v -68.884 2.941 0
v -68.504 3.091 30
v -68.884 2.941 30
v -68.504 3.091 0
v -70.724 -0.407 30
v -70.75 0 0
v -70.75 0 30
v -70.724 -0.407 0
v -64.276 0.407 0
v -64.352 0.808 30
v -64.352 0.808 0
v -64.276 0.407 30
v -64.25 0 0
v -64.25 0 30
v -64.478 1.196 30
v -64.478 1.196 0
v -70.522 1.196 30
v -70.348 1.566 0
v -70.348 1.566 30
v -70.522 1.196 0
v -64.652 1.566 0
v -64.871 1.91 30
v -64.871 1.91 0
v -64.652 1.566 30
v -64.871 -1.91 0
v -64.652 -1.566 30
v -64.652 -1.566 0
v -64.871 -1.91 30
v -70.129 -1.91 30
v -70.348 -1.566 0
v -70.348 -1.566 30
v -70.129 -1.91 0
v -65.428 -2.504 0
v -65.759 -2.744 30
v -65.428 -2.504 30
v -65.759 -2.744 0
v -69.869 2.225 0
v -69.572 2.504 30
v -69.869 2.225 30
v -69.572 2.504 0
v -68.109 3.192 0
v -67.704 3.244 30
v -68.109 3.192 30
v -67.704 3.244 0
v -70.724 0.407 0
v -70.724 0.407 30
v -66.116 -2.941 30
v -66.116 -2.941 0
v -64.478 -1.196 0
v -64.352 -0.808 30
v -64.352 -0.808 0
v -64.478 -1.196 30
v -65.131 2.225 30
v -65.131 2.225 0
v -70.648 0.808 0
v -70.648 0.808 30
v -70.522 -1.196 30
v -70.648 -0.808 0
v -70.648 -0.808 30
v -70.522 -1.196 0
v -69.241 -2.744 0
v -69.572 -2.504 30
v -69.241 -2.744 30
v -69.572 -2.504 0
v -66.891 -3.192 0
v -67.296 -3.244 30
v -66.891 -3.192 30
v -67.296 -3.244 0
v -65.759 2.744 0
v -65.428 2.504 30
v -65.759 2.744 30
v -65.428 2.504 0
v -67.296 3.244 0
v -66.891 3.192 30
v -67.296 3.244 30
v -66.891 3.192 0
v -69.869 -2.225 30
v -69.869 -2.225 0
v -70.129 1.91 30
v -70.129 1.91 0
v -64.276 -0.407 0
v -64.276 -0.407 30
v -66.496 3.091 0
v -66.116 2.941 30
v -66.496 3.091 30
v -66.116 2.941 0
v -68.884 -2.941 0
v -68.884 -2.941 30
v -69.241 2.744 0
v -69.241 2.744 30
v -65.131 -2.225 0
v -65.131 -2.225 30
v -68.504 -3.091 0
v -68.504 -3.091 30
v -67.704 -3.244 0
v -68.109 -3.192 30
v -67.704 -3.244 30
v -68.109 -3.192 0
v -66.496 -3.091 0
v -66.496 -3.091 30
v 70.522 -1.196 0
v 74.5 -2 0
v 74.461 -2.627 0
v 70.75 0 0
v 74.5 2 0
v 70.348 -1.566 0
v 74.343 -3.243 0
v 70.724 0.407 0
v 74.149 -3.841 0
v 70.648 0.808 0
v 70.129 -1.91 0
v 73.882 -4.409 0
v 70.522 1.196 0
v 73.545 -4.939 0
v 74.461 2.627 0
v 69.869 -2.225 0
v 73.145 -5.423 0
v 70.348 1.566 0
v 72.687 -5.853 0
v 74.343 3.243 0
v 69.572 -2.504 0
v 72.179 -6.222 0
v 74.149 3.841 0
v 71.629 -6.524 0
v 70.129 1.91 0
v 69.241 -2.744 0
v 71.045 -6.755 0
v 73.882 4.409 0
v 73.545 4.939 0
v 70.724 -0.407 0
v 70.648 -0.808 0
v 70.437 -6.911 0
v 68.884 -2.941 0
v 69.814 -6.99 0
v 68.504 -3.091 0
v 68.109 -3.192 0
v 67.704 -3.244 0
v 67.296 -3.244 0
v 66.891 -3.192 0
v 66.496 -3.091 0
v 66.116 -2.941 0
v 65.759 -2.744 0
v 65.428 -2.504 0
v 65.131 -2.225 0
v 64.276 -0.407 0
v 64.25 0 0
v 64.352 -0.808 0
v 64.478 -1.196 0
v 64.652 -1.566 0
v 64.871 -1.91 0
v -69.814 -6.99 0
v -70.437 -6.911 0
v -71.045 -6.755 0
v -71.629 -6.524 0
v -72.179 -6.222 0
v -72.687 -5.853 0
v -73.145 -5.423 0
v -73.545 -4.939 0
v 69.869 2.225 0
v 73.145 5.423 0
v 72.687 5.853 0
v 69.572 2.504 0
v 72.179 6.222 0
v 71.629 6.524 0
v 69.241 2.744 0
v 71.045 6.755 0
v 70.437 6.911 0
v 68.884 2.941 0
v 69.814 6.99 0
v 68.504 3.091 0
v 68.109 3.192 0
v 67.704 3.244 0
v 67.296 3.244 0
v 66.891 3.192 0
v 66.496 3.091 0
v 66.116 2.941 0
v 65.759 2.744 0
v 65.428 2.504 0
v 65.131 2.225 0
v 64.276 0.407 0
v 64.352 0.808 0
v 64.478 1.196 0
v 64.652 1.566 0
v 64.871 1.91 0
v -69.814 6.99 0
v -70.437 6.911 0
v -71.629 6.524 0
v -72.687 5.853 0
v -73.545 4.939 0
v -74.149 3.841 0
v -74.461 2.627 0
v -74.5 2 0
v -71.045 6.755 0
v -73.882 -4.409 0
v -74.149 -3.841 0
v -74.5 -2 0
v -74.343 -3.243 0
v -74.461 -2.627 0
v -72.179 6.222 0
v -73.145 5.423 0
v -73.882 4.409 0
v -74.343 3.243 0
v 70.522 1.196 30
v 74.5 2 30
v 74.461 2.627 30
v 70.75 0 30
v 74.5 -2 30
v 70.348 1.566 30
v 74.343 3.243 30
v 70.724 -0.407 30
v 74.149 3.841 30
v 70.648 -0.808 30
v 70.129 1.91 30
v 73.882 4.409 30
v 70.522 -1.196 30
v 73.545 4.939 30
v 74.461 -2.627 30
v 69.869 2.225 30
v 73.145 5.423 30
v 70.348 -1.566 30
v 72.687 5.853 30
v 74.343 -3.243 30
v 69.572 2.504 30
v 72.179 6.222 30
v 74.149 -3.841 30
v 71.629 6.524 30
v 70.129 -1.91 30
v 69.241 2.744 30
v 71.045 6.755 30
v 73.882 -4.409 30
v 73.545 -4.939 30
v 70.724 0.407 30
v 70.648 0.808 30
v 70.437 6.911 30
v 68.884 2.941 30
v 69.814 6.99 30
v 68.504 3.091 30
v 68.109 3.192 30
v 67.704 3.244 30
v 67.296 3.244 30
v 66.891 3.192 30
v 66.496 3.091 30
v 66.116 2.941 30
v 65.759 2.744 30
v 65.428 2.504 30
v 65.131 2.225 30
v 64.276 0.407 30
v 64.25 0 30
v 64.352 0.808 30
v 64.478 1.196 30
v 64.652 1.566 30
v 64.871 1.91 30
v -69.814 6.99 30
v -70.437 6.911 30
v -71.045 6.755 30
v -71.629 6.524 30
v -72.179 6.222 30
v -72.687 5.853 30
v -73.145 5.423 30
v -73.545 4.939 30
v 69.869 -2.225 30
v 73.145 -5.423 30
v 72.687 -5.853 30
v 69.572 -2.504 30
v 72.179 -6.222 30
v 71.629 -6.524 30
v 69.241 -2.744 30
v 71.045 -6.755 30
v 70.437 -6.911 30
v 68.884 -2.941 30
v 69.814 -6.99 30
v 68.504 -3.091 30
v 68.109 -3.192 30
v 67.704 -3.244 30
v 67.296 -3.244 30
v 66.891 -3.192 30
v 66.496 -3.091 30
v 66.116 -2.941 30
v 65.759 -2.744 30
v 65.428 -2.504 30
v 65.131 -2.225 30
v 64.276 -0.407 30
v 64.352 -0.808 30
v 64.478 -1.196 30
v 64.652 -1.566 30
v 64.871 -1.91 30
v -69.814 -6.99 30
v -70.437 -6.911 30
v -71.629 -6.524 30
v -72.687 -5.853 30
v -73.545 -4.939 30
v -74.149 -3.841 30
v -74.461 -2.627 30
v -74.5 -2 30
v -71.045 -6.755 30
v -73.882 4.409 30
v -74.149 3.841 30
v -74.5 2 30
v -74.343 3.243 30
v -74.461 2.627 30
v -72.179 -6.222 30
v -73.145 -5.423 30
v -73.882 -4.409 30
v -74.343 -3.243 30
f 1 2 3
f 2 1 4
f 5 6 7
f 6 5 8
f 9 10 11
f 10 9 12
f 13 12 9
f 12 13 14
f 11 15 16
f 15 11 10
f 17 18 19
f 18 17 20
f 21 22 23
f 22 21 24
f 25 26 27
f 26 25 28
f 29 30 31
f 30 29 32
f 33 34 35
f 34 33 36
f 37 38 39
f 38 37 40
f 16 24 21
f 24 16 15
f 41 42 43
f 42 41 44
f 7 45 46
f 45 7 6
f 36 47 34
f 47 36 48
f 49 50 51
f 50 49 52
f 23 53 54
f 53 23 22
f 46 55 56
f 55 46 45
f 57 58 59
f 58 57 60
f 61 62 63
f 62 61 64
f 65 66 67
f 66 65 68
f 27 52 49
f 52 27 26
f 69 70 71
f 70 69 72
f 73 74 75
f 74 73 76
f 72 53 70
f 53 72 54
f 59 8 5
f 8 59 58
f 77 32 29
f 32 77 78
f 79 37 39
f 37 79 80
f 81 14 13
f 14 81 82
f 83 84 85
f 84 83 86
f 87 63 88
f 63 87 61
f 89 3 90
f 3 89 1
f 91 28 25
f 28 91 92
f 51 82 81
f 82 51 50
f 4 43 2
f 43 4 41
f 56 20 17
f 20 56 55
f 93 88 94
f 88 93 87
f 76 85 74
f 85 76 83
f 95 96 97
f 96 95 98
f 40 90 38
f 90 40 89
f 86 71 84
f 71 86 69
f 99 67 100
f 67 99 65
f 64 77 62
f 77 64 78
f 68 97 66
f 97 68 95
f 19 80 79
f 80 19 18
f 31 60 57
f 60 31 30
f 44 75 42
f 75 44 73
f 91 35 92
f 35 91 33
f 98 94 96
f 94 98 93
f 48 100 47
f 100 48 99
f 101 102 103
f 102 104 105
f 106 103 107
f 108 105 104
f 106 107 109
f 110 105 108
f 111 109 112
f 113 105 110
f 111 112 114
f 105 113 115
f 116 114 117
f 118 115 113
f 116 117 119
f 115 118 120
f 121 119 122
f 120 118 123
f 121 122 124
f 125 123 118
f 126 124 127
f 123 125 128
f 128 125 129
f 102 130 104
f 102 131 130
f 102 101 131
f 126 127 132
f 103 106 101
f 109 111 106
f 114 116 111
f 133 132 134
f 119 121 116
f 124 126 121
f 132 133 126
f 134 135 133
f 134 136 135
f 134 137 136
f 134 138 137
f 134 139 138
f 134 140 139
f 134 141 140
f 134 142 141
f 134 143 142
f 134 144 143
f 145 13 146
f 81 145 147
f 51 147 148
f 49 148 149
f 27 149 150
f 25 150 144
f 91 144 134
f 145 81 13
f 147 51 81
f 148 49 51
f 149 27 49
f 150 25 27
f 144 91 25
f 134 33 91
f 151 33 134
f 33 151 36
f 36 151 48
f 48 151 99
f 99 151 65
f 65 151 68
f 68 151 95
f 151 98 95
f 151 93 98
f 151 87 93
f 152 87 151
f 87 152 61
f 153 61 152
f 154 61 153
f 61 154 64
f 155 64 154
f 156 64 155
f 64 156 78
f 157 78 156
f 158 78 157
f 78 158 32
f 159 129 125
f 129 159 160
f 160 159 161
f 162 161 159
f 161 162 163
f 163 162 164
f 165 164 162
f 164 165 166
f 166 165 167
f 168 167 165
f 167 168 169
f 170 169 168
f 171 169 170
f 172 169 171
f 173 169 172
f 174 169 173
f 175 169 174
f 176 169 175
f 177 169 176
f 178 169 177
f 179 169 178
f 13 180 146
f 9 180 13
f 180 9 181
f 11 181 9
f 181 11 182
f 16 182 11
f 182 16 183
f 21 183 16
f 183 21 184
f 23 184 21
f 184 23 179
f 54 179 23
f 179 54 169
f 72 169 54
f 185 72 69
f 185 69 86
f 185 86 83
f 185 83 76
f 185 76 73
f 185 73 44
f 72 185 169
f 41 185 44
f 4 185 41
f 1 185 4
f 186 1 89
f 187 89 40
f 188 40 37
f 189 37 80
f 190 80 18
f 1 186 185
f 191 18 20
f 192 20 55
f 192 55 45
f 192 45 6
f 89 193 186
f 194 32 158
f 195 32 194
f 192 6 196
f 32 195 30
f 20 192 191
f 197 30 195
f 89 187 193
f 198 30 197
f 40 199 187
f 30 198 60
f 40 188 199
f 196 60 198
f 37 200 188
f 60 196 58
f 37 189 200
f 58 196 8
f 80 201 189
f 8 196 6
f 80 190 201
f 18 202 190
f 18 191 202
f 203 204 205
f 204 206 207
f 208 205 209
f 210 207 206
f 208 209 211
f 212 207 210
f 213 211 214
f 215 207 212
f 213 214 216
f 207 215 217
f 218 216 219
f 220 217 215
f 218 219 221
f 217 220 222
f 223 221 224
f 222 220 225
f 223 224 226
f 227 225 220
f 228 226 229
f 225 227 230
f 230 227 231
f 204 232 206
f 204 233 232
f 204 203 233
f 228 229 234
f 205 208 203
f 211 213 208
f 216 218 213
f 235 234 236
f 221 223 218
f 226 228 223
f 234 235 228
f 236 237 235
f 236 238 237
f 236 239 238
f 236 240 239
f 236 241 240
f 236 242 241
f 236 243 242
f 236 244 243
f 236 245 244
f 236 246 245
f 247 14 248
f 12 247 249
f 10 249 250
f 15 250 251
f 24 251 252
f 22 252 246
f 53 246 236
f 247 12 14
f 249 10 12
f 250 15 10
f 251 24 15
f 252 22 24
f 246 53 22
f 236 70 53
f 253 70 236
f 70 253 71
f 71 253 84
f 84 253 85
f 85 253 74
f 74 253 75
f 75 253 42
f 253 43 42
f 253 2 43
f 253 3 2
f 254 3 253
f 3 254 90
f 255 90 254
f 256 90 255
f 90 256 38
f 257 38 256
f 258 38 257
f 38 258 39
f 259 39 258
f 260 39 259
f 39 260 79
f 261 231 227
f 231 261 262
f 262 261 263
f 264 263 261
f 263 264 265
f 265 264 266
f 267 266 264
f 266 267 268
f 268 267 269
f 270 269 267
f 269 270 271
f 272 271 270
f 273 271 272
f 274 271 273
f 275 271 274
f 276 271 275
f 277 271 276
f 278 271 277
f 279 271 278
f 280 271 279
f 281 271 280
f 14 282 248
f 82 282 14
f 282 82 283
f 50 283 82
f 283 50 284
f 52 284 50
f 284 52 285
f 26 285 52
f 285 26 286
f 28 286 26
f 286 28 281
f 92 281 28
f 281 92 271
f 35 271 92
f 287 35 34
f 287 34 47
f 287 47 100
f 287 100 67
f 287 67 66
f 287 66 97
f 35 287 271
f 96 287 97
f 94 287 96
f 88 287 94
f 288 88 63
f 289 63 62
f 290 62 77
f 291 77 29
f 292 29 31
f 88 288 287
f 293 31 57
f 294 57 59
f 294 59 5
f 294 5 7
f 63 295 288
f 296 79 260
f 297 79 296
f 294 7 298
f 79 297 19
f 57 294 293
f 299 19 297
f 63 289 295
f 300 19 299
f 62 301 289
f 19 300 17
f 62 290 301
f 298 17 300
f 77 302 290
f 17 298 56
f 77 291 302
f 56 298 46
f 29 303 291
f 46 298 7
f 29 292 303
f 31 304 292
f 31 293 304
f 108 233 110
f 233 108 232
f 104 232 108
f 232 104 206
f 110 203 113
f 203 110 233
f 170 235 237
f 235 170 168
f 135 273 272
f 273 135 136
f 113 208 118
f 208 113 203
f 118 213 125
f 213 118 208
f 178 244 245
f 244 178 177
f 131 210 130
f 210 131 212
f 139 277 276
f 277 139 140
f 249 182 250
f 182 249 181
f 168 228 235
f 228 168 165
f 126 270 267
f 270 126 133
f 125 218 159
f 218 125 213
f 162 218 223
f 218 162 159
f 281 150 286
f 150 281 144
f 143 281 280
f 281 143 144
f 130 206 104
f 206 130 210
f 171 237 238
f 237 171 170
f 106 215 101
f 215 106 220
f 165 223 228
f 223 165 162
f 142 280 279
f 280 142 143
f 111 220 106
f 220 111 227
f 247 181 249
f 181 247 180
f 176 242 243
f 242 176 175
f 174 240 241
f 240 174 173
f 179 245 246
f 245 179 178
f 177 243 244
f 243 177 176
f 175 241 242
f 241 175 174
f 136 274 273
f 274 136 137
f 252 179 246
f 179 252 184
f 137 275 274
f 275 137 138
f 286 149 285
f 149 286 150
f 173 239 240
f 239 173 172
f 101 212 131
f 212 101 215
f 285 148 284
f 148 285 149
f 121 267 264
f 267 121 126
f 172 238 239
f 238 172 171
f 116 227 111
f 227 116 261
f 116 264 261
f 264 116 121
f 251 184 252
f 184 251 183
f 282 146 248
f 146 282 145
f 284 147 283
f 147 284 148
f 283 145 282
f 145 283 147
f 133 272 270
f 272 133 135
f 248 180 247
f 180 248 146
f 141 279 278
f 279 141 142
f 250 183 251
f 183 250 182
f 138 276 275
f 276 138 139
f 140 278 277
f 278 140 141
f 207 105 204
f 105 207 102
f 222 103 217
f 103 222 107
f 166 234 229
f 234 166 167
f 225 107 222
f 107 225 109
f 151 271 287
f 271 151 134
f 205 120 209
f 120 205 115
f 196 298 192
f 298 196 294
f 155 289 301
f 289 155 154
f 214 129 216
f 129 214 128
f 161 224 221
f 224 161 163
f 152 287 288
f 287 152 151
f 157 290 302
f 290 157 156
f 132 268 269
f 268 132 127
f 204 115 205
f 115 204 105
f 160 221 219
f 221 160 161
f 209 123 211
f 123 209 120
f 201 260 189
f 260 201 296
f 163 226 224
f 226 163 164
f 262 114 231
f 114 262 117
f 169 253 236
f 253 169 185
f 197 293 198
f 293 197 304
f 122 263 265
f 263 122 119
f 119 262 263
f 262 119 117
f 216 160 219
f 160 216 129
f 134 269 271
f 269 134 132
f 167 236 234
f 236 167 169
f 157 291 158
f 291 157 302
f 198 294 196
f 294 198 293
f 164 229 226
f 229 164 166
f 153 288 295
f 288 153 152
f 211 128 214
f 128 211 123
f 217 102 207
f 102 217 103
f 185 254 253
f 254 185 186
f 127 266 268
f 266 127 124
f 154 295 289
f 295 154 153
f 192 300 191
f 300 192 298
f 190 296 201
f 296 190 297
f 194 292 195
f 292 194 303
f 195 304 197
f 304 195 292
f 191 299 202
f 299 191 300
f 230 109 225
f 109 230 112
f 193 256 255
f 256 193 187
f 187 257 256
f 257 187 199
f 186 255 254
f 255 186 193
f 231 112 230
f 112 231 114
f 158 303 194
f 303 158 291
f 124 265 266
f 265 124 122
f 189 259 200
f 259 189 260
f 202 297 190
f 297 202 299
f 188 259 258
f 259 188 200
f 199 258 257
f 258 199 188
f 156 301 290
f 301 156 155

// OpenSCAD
$fn = 50;


difference() {
	union() {
		hull() {
			translate(v = [-69.5000000000, 2.0000000000, 0]) {
				cylinder(h = 30, r = 5);
			}
			translate(v = [69.5000000000, 2.0000000000, 0]) {
				cylinder(h = 30, r = 5);
			}
			translate(v = [-69.5000000000, -2.0000000000, 0]) {
				cylinder(h = 30, r = 5);
			}
			translate(v = [69.5000000000, -2.0000000000, 0]) {
				cylinder(h = 30, r = 5);
			}
		}
	}
	union() {
		translate(v = [-67.5000000000, 0.0000000000, 0]) {
			cylinder(h = 30, r = 3.2500000000);
		}
		translate(v = [67.5000000000, 0.0000000000, 0]) {
			cylinder(h = 30, r = 3.2500000000);
		}
		translate(v = [-67.5000000000, 0.0000000000, 0]) {
			cylinder(h = 30, r = 1.8000000000);
		}
		translate(v = [67.5000000000, 0.0000000000, 0]) {
			cylinder(h = 30, r = 1.8000000000);
		}
		translate(v = [-67.5000000000, 0.0000000000, 0]) {
			cylinder(h = 30, r = 1.8000000000);
		}
		translate(v = [67.5000000000, 0.0000000000, 0]) {
			cylinder(h = 30, r = 1.8000000000);
		}
		translate(v = [-67.5000000000, 0.0000000000, 0]) {
			cylinder(h = 30, r = 1.8000000000);
		}
		translate(v = [67.5000000000, 0.0000000000, 0]) {
			cylinder(h = 30, r = 1.8000000000);
		}
	}
}
